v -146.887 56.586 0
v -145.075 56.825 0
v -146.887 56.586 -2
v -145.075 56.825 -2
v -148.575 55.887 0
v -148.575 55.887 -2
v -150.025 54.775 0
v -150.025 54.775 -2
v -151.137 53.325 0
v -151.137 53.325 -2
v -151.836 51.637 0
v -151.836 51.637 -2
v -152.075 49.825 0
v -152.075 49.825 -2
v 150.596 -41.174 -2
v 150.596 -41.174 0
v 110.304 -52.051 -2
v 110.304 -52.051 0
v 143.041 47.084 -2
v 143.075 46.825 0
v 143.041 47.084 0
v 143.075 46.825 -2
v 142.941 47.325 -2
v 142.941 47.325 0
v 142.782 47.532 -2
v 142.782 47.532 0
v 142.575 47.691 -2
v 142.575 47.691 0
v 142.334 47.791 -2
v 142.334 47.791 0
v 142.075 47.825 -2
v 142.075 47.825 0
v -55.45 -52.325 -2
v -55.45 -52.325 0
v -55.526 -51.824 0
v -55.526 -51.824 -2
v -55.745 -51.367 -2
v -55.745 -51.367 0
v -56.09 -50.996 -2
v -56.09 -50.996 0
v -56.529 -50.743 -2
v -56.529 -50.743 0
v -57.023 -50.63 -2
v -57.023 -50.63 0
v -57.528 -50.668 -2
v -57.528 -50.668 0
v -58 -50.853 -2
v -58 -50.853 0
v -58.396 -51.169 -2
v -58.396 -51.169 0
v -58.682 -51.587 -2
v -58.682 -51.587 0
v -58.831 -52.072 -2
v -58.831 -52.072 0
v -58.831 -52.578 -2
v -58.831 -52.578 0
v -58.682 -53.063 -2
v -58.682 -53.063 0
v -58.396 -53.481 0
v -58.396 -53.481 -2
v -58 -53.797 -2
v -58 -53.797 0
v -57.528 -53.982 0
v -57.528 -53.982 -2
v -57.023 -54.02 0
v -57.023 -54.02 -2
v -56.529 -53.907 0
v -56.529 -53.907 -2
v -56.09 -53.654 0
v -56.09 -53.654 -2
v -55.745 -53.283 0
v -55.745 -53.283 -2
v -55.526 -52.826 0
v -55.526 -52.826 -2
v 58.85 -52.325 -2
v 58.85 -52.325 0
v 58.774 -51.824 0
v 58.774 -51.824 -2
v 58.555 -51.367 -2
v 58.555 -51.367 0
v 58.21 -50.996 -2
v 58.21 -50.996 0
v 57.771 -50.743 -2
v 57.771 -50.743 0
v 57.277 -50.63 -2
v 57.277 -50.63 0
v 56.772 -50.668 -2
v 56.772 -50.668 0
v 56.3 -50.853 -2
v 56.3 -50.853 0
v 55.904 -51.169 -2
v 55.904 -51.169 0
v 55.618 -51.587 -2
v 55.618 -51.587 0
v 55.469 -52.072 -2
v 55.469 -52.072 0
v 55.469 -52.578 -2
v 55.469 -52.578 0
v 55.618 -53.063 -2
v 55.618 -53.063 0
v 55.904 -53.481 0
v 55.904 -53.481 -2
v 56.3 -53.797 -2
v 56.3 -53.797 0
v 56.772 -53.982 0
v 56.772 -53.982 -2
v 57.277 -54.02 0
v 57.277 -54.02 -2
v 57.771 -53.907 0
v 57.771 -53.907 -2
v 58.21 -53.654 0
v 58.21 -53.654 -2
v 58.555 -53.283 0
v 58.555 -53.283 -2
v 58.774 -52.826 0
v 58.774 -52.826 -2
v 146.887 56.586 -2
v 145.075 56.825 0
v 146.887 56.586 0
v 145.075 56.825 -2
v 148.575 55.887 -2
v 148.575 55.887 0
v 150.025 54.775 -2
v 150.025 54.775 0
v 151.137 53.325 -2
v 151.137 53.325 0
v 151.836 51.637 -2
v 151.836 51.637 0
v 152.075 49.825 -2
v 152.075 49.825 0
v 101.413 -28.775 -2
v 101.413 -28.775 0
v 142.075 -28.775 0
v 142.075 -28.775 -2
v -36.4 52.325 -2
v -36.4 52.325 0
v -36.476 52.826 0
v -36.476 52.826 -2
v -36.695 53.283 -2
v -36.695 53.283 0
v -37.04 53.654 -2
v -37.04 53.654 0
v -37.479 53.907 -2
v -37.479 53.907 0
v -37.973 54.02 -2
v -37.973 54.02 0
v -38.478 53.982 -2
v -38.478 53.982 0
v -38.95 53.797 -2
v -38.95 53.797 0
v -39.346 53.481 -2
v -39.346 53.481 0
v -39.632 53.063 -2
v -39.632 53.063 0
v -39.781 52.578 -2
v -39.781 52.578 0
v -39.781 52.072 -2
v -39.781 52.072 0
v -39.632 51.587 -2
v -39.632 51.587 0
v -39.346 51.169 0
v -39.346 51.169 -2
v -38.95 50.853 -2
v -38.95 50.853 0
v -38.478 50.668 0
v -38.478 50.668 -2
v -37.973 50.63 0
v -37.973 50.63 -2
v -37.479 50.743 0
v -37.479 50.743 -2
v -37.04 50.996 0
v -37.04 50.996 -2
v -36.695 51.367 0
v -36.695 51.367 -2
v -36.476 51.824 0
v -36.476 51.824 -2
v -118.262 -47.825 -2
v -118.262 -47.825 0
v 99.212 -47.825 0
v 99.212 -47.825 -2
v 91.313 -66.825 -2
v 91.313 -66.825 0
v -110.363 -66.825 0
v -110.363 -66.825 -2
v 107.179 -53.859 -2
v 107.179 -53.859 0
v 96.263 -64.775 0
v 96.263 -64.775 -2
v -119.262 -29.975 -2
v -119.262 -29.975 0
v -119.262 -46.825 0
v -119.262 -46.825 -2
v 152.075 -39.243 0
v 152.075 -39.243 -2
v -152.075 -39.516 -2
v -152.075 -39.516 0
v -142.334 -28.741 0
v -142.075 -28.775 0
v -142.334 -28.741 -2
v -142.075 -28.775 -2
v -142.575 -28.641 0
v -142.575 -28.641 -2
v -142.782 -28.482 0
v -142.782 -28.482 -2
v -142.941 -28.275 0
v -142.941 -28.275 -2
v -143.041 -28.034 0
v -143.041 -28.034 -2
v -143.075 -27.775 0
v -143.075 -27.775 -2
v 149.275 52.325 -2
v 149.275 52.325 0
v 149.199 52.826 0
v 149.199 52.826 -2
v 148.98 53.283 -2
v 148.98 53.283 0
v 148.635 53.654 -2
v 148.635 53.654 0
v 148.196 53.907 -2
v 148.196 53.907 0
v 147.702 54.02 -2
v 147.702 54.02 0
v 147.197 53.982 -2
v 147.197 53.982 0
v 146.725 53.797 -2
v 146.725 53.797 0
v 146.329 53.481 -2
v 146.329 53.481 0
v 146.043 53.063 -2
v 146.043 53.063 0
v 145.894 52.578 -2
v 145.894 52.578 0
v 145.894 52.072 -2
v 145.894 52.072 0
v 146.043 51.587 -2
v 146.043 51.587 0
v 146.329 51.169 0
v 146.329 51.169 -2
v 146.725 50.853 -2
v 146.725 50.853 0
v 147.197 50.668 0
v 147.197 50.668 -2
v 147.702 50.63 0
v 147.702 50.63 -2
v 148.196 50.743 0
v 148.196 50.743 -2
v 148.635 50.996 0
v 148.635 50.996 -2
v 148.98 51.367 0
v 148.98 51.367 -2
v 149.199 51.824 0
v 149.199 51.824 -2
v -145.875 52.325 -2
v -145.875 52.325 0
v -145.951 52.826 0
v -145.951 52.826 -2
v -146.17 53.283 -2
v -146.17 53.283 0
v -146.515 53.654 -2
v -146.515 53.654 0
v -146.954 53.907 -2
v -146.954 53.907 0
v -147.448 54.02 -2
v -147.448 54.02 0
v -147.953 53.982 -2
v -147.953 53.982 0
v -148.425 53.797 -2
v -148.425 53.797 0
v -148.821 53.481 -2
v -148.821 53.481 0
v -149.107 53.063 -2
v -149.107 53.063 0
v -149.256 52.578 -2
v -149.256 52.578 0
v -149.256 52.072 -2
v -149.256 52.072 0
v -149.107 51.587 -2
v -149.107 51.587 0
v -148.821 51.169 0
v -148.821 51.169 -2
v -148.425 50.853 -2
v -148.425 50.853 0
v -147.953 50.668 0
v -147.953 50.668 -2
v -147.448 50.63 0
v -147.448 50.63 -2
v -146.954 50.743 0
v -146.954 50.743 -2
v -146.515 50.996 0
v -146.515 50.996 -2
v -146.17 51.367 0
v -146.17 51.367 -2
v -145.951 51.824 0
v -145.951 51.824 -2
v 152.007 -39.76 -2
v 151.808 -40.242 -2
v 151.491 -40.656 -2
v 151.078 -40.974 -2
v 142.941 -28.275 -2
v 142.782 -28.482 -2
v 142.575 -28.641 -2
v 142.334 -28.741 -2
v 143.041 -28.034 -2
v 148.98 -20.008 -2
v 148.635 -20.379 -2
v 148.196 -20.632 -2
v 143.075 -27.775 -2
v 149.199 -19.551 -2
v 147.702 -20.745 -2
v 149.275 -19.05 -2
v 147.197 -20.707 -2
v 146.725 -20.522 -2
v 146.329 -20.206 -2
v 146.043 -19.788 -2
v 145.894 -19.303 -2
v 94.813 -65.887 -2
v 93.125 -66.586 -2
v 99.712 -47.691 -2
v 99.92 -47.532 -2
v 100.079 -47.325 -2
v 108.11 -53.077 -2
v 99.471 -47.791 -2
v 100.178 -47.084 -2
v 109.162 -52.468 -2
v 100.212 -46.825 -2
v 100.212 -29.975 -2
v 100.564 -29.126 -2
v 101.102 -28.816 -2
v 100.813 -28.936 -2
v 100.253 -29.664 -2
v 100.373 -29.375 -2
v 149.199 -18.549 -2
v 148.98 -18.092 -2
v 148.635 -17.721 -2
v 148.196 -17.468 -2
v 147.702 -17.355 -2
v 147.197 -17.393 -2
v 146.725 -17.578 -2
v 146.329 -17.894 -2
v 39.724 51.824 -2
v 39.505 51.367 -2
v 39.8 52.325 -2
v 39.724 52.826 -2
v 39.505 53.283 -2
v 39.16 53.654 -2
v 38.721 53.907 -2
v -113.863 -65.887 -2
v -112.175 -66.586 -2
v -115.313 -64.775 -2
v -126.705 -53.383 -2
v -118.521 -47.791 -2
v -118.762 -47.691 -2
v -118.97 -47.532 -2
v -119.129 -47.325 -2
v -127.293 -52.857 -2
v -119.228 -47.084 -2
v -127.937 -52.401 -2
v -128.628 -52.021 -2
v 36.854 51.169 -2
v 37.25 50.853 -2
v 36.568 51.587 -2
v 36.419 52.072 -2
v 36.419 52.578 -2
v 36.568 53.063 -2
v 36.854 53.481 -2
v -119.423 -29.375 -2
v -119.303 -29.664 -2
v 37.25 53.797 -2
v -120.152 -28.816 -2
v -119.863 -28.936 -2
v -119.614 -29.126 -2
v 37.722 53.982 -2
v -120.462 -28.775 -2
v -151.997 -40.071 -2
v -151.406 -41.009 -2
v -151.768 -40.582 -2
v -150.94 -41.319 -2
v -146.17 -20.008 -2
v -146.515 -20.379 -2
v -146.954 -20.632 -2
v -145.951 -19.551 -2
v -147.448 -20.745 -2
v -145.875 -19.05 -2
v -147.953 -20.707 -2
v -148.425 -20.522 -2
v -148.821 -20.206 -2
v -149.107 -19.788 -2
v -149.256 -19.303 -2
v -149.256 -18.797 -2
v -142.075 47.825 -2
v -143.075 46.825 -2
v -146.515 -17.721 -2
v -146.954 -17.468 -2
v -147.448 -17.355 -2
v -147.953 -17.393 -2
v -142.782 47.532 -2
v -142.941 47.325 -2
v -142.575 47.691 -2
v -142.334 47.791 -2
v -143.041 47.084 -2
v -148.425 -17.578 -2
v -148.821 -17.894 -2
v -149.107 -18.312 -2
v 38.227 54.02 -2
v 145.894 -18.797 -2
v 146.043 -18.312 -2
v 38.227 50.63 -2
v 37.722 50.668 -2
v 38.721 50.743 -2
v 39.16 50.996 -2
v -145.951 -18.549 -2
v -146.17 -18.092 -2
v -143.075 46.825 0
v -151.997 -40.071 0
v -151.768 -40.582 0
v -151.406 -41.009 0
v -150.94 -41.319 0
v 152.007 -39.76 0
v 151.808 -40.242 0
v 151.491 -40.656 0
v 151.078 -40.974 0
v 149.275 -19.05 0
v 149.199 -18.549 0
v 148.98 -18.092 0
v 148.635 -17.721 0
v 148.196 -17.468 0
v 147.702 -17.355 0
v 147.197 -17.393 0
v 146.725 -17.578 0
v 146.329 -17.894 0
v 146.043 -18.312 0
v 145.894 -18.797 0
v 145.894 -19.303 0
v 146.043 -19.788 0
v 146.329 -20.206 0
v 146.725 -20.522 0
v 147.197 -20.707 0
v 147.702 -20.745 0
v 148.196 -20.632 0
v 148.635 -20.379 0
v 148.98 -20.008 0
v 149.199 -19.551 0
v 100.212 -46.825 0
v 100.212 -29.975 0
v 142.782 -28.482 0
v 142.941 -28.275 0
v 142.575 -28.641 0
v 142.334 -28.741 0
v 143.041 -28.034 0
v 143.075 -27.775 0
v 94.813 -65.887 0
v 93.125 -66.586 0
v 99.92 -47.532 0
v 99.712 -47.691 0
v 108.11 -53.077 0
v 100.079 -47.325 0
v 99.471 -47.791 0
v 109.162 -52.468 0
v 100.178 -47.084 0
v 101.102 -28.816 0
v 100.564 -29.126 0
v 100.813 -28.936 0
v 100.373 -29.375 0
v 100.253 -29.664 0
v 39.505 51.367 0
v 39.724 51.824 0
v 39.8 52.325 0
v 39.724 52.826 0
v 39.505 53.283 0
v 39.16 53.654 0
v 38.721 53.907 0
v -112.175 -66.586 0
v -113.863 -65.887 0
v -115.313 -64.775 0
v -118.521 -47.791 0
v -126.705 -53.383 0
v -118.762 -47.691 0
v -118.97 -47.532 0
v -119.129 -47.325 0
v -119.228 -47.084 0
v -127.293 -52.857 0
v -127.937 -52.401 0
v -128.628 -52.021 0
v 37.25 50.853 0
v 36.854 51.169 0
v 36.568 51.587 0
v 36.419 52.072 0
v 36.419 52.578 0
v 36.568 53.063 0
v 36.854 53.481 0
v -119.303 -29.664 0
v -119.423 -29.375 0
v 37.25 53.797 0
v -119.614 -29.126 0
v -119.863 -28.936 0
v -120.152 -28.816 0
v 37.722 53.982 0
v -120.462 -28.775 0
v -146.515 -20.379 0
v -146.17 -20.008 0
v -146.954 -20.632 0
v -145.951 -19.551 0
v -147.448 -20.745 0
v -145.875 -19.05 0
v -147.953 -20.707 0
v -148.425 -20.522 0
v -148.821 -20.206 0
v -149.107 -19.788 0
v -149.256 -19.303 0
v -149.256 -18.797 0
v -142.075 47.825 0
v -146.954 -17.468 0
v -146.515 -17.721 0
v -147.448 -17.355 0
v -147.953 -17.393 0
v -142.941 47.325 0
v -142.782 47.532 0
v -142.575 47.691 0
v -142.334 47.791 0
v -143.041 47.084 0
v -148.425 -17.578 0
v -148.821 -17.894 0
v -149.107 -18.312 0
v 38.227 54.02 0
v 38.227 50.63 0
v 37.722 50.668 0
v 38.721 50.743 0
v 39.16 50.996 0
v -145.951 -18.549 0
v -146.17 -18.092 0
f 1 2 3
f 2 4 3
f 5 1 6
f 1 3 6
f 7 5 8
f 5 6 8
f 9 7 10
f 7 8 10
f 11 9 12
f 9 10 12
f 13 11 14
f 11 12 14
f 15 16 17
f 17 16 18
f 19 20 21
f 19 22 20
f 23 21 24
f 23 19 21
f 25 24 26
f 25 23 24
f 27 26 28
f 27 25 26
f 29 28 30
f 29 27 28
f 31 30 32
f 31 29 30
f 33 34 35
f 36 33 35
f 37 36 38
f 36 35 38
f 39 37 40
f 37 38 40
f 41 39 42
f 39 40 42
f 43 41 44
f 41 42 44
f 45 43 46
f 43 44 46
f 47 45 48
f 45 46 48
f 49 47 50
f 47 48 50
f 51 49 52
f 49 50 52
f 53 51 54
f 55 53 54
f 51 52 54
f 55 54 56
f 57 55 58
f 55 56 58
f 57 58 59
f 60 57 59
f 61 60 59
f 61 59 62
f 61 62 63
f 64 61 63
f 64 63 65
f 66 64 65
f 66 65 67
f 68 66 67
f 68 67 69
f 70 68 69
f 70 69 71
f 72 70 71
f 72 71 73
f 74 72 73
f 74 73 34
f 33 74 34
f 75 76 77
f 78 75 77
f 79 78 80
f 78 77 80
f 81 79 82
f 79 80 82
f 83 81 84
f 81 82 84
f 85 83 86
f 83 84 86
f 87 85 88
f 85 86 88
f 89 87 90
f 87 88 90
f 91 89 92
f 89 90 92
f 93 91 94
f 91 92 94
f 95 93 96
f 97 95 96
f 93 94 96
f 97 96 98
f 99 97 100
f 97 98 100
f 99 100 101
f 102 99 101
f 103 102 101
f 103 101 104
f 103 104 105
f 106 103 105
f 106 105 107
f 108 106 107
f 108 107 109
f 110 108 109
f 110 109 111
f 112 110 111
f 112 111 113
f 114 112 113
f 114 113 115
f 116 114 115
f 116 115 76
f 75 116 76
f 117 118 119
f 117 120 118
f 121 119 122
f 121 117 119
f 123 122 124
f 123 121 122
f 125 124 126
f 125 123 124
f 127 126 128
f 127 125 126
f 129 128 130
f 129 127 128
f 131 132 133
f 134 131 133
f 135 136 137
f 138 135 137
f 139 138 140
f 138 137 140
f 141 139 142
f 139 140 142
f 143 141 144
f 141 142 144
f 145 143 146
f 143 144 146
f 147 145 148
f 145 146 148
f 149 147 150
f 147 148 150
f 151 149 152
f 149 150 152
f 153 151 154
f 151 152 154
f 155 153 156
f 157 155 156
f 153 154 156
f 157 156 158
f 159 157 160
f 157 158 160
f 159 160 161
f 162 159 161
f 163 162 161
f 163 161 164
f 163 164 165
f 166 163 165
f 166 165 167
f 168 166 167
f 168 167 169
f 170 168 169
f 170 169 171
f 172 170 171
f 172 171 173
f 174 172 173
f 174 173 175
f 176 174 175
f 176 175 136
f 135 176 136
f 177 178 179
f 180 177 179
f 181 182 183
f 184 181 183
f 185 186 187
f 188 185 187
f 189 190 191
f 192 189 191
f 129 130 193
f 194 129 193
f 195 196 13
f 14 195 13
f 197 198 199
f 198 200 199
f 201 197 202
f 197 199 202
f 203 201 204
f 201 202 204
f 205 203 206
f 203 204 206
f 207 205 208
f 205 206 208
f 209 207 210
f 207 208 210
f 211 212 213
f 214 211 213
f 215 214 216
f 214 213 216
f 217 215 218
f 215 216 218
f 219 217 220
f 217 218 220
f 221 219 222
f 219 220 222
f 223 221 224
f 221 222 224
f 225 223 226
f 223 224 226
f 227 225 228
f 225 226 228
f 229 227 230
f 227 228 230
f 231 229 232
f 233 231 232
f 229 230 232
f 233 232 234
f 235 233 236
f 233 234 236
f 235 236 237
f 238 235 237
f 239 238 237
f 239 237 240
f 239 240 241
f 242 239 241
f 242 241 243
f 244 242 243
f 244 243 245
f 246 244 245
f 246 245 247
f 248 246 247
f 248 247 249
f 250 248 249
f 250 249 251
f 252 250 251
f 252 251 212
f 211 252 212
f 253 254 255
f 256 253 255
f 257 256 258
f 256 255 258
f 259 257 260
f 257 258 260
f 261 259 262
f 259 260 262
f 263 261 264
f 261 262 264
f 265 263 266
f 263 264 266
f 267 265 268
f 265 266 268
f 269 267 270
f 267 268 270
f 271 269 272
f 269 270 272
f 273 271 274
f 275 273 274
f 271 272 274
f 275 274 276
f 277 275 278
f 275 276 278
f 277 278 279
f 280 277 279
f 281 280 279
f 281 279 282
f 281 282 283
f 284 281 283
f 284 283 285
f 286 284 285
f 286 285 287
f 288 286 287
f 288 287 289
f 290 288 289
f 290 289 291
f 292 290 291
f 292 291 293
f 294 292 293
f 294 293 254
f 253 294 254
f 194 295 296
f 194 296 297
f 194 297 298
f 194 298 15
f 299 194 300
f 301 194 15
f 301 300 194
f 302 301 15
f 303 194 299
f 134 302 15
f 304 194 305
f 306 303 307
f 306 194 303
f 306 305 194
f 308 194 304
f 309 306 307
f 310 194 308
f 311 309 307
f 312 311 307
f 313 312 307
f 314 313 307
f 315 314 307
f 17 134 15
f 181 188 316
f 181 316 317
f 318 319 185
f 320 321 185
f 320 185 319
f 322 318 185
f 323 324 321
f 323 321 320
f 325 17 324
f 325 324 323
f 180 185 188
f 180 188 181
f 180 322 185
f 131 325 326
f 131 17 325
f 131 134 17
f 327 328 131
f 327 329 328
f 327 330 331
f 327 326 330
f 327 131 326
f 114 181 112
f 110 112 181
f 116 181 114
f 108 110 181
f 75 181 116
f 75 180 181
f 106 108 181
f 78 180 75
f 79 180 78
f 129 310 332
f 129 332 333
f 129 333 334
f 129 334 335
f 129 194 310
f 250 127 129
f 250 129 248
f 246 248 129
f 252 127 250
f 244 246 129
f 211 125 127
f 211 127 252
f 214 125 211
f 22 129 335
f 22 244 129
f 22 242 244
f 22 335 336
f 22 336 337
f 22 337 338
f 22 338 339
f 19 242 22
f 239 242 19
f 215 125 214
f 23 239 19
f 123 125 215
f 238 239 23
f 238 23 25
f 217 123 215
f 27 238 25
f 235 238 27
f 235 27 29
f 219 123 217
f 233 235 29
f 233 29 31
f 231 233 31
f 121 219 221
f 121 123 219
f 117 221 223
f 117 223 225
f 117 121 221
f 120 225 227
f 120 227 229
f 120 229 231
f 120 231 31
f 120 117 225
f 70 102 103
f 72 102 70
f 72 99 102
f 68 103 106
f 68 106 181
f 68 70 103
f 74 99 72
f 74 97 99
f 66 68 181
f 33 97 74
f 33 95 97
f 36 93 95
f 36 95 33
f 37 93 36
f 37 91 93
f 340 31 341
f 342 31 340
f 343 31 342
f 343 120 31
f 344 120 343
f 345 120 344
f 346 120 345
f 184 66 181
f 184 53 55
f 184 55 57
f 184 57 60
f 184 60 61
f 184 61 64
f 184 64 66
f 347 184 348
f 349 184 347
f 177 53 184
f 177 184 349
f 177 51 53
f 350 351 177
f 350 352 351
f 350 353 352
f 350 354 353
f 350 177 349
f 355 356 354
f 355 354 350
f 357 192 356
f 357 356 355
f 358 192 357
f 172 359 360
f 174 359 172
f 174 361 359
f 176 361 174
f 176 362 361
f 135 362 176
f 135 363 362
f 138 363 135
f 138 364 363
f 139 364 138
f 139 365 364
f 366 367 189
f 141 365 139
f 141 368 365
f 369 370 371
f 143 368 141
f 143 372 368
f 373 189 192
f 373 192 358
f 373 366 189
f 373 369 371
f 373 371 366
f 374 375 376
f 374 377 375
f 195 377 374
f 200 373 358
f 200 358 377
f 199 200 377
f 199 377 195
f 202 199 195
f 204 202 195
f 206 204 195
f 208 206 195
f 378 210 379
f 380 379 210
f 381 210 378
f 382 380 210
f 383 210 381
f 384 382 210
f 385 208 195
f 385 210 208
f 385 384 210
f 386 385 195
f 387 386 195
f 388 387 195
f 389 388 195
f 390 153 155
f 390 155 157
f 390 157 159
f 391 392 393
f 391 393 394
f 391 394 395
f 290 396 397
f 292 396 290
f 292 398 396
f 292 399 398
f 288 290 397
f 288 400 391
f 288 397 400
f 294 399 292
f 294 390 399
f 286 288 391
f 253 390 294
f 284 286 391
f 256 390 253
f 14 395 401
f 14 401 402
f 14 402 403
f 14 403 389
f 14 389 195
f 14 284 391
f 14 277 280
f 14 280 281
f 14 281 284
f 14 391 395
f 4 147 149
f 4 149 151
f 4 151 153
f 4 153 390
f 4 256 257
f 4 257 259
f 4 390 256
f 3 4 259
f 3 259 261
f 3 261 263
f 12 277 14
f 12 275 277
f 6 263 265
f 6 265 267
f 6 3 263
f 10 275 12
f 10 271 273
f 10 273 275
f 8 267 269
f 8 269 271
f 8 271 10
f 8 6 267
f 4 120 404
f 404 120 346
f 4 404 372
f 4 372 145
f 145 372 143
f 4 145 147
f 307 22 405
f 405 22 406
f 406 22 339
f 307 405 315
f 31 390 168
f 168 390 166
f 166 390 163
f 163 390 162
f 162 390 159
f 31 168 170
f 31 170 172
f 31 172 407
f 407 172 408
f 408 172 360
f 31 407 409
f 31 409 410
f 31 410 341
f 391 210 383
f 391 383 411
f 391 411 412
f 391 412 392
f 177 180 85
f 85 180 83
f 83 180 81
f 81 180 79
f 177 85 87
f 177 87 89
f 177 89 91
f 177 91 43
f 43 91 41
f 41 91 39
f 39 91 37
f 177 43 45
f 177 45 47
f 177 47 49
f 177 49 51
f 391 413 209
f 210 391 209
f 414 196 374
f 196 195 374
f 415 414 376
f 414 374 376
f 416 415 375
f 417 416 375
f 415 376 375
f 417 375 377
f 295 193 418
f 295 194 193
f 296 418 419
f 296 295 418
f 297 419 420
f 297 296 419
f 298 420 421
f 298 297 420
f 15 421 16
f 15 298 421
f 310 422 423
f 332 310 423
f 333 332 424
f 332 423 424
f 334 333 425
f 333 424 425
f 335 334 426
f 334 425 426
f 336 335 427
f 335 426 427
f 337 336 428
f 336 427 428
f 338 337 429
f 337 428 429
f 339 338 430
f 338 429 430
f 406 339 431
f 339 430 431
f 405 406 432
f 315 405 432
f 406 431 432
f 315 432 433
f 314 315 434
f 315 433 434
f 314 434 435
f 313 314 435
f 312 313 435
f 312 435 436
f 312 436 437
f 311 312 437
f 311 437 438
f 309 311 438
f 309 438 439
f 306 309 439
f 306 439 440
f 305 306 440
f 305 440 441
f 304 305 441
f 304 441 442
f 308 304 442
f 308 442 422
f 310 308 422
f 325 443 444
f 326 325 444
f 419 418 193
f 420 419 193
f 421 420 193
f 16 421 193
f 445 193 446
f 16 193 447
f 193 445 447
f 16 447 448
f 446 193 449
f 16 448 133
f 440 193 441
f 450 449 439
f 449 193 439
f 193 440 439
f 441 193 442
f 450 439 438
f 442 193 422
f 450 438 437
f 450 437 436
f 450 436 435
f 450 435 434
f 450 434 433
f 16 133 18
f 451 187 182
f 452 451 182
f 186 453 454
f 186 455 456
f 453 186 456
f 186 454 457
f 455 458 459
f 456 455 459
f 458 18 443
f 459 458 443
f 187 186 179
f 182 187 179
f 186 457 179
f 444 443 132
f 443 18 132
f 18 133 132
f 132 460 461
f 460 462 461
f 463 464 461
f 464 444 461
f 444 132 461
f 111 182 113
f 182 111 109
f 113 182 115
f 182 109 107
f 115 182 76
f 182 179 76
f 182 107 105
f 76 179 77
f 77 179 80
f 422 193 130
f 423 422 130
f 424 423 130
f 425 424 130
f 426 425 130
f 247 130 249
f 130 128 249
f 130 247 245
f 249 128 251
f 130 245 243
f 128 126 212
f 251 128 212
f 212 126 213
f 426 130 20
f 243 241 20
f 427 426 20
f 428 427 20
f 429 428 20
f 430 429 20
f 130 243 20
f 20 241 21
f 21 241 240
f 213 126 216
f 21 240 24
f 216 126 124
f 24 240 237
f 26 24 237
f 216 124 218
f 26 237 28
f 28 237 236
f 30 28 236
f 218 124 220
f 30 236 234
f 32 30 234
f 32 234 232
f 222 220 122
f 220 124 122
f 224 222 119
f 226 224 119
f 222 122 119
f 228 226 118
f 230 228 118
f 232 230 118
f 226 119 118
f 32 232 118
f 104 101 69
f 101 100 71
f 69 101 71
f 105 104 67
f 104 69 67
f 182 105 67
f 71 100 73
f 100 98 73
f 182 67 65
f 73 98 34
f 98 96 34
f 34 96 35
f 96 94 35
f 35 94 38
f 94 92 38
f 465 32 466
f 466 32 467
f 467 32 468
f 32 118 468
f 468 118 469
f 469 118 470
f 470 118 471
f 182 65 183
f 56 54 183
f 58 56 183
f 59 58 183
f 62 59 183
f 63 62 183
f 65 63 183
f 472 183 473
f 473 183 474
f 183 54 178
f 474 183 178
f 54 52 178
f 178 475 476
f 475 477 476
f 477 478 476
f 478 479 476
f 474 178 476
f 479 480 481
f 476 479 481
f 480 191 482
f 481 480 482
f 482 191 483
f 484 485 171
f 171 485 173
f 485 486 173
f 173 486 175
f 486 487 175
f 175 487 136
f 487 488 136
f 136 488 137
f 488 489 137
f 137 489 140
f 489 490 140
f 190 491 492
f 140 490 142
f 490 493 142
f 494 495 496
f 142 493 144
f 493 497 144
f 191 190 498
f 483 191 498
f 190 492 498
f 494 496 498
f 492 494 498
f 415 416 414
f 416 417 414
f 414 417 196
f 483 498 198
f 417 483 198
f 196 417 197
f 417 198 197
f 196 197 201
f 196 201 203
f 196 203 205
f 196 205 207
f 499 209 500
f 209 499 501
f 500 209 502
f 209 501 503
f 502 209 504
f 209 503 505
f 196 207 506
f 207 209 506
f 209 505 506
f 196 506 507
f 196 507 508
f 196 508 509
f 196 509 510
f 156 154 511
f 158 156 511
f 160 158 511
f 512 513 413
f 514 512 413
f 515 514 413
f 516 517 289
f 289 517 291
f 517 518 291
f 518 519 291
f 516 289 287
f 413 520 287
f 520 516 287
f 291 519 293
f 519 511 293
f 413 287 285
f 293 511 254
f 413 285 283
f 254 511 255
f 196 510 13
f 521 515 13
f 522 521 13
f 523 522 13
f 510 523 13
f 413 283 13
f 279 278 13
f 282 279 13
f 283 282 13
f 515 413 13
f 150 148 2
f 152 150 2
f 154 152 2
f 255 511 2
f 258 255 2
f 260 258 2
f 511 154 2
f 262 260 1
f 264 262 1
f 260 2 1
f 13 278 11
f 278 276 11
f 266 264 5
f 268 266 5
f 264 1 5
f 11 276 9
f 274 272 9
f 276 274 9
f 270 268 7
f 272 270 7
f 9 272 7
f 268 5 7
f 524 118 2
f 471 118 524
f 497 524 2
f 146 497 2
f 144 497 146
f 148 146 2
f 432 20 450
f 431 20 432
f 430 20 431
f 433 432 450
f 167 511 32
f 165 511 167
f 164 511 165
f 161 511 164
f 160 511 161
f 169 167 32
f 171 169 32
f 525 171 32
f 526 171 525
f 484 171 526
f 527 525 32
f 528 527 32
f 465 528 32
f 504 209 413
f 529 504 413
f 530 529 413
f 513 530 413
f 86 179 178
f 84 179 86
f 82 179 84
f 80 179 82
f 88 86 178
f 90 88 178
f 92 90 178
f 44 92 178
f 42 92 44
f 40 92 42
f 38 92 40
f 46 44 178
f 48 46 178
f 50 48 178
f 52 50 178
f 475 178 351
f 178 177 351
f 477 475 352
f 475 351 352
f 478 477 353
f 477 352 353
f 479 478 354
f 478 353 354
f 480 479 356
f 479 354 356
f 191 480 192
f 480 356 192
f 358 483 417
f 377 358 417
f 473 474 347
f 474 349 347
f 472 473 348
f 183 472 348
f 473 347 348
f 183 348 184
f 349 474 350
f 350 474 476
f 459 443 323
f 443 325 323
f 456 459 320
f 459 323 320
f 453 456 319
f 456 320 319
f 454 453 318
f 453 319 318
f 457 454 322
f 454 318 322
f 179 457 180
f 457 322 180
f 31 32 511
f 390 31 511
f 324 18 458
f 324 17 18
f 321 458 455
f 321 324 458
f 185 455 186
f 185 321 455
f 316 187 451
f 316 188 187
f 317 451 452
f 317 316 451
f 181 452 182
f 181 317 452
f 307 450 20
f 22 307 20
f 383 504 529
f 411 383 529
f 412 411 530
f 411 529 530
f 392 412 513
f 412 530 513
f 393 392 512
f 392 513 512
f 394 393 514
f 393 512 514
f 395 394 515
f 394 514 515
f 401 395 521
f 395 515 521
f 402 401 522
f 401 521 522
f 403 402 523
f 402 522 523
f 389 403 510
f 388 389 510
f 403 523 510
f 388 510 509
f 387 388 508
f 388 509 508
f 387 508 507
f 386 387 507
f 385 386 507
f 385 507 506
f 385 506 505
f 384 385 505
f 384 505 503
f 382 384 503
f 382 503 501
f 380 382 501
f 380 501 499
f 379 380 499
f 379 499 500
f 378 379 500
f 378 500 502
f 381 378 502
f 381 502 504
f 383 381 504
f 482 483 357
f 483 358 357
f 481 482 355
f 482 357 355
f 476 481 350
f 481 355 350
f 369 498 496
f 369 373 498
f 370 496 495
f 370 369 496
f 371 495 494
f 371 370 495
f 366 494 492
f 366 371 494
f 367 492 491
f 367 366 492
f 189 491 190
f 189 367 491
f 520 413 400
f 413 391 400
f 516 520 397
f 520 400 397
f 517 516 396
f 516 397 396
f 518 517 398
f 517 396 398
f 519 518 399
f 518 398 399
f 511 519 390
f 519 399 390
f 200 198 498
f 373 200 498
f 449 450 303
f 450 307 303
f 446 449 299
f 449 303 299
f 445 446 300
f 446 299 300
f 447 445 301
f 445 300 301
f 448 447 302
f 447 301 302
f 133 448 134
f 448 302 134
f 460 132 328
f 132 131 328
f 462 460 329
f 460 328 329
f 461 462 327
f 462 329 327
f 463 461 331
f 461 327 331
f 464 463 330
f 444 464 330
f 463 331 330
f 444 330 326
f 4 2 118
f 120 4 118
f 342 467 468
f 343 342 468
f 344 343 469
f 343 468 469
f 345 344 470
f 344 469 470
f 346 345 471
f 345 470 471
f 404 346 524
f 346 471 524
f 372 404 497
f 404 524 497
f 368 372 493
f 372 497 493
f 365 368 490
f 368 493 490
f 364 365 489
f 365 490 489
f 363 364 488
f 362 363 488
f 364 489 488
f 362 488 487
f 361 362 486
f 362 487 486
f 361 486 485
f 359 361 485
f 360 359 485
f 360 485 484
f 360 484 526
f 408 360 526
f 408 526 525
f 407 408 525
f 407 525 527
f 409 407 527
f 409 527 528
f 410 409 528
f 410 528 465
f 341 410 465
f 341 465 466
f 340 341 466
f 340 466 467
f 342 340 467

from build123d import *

# Parameters (mm, degrees)
PAD001_DEPTH  = 2
FILLET004_R   = 7
FILLET013_R   = 2
FILLET005_R   = 1
FILLET006_R   = 1.2
SKETCH014_R   = 1.7
HOLE003_DEPTH = 25


with BuildPart() as part:
    # Sketch001 → Pad001 (new body)
    with BuildSketch(Plane.XY):
        Polygon((-152.075, 56.825), (152.075, 56.825), (152.075, -40.775), (108.5, -52.5375), (94.2125, -66.825), (-113.2625, -66.825), (-127.55, -52.5375), (-152.075, -40.775), align=None)
        Polygon((143.075, 47.825), (-143.075, 47.825), (-143.075, -28.775), (-119.2625, -28.775), (-119.2625, -47.825), (100.2125, -47.825), (100.2125, -28.775), (143.075, -28.775), align=None, mode=Mode.SUBTRACT)
    extrude(amount=-PAD001_DEPTH)

    # Fillet004
    fillet004_edges = [part.edges().sort_by_distance(p)[0] for p in [
        (152.075, 56.825, -1),
        (108.5, -52.5375, -1),
        (94.2125, -66.825, -1),
        (-113.2625, -66.825, -1),
        (-127.55, -52.5375, -1),
        (-152.075, 56.825, -1),
    ]]
    fillet(fillet004_edges, radius=FILLET004_R)

    # Fillet013
    fillet013_edges = [part.edges().sort_by_distance(p)[0] for p in [
        (-152.075, -40.775, -1),
        (152.075, -40.775, -1),
    ]]
    fillet(fillet013_edges, radius=FILLET013_R)

    # Fillet005
    fillet005_edges = [part.edges().sort_by_distance(p)[0] for p in [
        (143.075, 47.825, -1),
        (143.075, -28.775, -1),
        (100.2125, -47.825, -1),
        (-143.075, -28.775, -1),
        (-119.2625, -47.825, -1),
        (-143.075, 47.825, -1),
    ]]
    fillet(fillet005_edges, radius=FILLET005_R)

    # Fillet006
    fillet006_edges = [part.edges().sort_by_distance(p)[0] for p in [
        (-119.2625, -28.775, -1),
        (100.2125, -28.775, -1),
    ]]
    fillet(fillet006_edges, radius=FILLET006_R)

    # Sketch014 (on Face1 of Fillet006) → Hole003 (cut)
    with BuildSketch(Plane.XY):
        with Locations((147.575, 52.325)):
            Circle(SKETCH014_R)
        with Locations((147.575, -19.05)):
            Circle(SKETCH014_R)
        with Locations((57.15, -52.325)):
            Circle(SKETCH014_R)
        with Locations((-57.15, -52.325)):
            Circle(SKETCH014_R)
        with Locations((-147.575, -19.05)):
            Circle(SKETCH014_R)
        with Locations((-147.575, 52.325)):
            Circle(SKETCH014_R)
        with Locations((-38.1, 52.325)):
            Circle(SKETCH014_R)
        with Locations((38.1, 52.325)):
            Circle(SKETCH014_R)
    extrude(amount=-HOLE003_DEPTH, mode=Mode.SUBTRACT)


solid = part.part
